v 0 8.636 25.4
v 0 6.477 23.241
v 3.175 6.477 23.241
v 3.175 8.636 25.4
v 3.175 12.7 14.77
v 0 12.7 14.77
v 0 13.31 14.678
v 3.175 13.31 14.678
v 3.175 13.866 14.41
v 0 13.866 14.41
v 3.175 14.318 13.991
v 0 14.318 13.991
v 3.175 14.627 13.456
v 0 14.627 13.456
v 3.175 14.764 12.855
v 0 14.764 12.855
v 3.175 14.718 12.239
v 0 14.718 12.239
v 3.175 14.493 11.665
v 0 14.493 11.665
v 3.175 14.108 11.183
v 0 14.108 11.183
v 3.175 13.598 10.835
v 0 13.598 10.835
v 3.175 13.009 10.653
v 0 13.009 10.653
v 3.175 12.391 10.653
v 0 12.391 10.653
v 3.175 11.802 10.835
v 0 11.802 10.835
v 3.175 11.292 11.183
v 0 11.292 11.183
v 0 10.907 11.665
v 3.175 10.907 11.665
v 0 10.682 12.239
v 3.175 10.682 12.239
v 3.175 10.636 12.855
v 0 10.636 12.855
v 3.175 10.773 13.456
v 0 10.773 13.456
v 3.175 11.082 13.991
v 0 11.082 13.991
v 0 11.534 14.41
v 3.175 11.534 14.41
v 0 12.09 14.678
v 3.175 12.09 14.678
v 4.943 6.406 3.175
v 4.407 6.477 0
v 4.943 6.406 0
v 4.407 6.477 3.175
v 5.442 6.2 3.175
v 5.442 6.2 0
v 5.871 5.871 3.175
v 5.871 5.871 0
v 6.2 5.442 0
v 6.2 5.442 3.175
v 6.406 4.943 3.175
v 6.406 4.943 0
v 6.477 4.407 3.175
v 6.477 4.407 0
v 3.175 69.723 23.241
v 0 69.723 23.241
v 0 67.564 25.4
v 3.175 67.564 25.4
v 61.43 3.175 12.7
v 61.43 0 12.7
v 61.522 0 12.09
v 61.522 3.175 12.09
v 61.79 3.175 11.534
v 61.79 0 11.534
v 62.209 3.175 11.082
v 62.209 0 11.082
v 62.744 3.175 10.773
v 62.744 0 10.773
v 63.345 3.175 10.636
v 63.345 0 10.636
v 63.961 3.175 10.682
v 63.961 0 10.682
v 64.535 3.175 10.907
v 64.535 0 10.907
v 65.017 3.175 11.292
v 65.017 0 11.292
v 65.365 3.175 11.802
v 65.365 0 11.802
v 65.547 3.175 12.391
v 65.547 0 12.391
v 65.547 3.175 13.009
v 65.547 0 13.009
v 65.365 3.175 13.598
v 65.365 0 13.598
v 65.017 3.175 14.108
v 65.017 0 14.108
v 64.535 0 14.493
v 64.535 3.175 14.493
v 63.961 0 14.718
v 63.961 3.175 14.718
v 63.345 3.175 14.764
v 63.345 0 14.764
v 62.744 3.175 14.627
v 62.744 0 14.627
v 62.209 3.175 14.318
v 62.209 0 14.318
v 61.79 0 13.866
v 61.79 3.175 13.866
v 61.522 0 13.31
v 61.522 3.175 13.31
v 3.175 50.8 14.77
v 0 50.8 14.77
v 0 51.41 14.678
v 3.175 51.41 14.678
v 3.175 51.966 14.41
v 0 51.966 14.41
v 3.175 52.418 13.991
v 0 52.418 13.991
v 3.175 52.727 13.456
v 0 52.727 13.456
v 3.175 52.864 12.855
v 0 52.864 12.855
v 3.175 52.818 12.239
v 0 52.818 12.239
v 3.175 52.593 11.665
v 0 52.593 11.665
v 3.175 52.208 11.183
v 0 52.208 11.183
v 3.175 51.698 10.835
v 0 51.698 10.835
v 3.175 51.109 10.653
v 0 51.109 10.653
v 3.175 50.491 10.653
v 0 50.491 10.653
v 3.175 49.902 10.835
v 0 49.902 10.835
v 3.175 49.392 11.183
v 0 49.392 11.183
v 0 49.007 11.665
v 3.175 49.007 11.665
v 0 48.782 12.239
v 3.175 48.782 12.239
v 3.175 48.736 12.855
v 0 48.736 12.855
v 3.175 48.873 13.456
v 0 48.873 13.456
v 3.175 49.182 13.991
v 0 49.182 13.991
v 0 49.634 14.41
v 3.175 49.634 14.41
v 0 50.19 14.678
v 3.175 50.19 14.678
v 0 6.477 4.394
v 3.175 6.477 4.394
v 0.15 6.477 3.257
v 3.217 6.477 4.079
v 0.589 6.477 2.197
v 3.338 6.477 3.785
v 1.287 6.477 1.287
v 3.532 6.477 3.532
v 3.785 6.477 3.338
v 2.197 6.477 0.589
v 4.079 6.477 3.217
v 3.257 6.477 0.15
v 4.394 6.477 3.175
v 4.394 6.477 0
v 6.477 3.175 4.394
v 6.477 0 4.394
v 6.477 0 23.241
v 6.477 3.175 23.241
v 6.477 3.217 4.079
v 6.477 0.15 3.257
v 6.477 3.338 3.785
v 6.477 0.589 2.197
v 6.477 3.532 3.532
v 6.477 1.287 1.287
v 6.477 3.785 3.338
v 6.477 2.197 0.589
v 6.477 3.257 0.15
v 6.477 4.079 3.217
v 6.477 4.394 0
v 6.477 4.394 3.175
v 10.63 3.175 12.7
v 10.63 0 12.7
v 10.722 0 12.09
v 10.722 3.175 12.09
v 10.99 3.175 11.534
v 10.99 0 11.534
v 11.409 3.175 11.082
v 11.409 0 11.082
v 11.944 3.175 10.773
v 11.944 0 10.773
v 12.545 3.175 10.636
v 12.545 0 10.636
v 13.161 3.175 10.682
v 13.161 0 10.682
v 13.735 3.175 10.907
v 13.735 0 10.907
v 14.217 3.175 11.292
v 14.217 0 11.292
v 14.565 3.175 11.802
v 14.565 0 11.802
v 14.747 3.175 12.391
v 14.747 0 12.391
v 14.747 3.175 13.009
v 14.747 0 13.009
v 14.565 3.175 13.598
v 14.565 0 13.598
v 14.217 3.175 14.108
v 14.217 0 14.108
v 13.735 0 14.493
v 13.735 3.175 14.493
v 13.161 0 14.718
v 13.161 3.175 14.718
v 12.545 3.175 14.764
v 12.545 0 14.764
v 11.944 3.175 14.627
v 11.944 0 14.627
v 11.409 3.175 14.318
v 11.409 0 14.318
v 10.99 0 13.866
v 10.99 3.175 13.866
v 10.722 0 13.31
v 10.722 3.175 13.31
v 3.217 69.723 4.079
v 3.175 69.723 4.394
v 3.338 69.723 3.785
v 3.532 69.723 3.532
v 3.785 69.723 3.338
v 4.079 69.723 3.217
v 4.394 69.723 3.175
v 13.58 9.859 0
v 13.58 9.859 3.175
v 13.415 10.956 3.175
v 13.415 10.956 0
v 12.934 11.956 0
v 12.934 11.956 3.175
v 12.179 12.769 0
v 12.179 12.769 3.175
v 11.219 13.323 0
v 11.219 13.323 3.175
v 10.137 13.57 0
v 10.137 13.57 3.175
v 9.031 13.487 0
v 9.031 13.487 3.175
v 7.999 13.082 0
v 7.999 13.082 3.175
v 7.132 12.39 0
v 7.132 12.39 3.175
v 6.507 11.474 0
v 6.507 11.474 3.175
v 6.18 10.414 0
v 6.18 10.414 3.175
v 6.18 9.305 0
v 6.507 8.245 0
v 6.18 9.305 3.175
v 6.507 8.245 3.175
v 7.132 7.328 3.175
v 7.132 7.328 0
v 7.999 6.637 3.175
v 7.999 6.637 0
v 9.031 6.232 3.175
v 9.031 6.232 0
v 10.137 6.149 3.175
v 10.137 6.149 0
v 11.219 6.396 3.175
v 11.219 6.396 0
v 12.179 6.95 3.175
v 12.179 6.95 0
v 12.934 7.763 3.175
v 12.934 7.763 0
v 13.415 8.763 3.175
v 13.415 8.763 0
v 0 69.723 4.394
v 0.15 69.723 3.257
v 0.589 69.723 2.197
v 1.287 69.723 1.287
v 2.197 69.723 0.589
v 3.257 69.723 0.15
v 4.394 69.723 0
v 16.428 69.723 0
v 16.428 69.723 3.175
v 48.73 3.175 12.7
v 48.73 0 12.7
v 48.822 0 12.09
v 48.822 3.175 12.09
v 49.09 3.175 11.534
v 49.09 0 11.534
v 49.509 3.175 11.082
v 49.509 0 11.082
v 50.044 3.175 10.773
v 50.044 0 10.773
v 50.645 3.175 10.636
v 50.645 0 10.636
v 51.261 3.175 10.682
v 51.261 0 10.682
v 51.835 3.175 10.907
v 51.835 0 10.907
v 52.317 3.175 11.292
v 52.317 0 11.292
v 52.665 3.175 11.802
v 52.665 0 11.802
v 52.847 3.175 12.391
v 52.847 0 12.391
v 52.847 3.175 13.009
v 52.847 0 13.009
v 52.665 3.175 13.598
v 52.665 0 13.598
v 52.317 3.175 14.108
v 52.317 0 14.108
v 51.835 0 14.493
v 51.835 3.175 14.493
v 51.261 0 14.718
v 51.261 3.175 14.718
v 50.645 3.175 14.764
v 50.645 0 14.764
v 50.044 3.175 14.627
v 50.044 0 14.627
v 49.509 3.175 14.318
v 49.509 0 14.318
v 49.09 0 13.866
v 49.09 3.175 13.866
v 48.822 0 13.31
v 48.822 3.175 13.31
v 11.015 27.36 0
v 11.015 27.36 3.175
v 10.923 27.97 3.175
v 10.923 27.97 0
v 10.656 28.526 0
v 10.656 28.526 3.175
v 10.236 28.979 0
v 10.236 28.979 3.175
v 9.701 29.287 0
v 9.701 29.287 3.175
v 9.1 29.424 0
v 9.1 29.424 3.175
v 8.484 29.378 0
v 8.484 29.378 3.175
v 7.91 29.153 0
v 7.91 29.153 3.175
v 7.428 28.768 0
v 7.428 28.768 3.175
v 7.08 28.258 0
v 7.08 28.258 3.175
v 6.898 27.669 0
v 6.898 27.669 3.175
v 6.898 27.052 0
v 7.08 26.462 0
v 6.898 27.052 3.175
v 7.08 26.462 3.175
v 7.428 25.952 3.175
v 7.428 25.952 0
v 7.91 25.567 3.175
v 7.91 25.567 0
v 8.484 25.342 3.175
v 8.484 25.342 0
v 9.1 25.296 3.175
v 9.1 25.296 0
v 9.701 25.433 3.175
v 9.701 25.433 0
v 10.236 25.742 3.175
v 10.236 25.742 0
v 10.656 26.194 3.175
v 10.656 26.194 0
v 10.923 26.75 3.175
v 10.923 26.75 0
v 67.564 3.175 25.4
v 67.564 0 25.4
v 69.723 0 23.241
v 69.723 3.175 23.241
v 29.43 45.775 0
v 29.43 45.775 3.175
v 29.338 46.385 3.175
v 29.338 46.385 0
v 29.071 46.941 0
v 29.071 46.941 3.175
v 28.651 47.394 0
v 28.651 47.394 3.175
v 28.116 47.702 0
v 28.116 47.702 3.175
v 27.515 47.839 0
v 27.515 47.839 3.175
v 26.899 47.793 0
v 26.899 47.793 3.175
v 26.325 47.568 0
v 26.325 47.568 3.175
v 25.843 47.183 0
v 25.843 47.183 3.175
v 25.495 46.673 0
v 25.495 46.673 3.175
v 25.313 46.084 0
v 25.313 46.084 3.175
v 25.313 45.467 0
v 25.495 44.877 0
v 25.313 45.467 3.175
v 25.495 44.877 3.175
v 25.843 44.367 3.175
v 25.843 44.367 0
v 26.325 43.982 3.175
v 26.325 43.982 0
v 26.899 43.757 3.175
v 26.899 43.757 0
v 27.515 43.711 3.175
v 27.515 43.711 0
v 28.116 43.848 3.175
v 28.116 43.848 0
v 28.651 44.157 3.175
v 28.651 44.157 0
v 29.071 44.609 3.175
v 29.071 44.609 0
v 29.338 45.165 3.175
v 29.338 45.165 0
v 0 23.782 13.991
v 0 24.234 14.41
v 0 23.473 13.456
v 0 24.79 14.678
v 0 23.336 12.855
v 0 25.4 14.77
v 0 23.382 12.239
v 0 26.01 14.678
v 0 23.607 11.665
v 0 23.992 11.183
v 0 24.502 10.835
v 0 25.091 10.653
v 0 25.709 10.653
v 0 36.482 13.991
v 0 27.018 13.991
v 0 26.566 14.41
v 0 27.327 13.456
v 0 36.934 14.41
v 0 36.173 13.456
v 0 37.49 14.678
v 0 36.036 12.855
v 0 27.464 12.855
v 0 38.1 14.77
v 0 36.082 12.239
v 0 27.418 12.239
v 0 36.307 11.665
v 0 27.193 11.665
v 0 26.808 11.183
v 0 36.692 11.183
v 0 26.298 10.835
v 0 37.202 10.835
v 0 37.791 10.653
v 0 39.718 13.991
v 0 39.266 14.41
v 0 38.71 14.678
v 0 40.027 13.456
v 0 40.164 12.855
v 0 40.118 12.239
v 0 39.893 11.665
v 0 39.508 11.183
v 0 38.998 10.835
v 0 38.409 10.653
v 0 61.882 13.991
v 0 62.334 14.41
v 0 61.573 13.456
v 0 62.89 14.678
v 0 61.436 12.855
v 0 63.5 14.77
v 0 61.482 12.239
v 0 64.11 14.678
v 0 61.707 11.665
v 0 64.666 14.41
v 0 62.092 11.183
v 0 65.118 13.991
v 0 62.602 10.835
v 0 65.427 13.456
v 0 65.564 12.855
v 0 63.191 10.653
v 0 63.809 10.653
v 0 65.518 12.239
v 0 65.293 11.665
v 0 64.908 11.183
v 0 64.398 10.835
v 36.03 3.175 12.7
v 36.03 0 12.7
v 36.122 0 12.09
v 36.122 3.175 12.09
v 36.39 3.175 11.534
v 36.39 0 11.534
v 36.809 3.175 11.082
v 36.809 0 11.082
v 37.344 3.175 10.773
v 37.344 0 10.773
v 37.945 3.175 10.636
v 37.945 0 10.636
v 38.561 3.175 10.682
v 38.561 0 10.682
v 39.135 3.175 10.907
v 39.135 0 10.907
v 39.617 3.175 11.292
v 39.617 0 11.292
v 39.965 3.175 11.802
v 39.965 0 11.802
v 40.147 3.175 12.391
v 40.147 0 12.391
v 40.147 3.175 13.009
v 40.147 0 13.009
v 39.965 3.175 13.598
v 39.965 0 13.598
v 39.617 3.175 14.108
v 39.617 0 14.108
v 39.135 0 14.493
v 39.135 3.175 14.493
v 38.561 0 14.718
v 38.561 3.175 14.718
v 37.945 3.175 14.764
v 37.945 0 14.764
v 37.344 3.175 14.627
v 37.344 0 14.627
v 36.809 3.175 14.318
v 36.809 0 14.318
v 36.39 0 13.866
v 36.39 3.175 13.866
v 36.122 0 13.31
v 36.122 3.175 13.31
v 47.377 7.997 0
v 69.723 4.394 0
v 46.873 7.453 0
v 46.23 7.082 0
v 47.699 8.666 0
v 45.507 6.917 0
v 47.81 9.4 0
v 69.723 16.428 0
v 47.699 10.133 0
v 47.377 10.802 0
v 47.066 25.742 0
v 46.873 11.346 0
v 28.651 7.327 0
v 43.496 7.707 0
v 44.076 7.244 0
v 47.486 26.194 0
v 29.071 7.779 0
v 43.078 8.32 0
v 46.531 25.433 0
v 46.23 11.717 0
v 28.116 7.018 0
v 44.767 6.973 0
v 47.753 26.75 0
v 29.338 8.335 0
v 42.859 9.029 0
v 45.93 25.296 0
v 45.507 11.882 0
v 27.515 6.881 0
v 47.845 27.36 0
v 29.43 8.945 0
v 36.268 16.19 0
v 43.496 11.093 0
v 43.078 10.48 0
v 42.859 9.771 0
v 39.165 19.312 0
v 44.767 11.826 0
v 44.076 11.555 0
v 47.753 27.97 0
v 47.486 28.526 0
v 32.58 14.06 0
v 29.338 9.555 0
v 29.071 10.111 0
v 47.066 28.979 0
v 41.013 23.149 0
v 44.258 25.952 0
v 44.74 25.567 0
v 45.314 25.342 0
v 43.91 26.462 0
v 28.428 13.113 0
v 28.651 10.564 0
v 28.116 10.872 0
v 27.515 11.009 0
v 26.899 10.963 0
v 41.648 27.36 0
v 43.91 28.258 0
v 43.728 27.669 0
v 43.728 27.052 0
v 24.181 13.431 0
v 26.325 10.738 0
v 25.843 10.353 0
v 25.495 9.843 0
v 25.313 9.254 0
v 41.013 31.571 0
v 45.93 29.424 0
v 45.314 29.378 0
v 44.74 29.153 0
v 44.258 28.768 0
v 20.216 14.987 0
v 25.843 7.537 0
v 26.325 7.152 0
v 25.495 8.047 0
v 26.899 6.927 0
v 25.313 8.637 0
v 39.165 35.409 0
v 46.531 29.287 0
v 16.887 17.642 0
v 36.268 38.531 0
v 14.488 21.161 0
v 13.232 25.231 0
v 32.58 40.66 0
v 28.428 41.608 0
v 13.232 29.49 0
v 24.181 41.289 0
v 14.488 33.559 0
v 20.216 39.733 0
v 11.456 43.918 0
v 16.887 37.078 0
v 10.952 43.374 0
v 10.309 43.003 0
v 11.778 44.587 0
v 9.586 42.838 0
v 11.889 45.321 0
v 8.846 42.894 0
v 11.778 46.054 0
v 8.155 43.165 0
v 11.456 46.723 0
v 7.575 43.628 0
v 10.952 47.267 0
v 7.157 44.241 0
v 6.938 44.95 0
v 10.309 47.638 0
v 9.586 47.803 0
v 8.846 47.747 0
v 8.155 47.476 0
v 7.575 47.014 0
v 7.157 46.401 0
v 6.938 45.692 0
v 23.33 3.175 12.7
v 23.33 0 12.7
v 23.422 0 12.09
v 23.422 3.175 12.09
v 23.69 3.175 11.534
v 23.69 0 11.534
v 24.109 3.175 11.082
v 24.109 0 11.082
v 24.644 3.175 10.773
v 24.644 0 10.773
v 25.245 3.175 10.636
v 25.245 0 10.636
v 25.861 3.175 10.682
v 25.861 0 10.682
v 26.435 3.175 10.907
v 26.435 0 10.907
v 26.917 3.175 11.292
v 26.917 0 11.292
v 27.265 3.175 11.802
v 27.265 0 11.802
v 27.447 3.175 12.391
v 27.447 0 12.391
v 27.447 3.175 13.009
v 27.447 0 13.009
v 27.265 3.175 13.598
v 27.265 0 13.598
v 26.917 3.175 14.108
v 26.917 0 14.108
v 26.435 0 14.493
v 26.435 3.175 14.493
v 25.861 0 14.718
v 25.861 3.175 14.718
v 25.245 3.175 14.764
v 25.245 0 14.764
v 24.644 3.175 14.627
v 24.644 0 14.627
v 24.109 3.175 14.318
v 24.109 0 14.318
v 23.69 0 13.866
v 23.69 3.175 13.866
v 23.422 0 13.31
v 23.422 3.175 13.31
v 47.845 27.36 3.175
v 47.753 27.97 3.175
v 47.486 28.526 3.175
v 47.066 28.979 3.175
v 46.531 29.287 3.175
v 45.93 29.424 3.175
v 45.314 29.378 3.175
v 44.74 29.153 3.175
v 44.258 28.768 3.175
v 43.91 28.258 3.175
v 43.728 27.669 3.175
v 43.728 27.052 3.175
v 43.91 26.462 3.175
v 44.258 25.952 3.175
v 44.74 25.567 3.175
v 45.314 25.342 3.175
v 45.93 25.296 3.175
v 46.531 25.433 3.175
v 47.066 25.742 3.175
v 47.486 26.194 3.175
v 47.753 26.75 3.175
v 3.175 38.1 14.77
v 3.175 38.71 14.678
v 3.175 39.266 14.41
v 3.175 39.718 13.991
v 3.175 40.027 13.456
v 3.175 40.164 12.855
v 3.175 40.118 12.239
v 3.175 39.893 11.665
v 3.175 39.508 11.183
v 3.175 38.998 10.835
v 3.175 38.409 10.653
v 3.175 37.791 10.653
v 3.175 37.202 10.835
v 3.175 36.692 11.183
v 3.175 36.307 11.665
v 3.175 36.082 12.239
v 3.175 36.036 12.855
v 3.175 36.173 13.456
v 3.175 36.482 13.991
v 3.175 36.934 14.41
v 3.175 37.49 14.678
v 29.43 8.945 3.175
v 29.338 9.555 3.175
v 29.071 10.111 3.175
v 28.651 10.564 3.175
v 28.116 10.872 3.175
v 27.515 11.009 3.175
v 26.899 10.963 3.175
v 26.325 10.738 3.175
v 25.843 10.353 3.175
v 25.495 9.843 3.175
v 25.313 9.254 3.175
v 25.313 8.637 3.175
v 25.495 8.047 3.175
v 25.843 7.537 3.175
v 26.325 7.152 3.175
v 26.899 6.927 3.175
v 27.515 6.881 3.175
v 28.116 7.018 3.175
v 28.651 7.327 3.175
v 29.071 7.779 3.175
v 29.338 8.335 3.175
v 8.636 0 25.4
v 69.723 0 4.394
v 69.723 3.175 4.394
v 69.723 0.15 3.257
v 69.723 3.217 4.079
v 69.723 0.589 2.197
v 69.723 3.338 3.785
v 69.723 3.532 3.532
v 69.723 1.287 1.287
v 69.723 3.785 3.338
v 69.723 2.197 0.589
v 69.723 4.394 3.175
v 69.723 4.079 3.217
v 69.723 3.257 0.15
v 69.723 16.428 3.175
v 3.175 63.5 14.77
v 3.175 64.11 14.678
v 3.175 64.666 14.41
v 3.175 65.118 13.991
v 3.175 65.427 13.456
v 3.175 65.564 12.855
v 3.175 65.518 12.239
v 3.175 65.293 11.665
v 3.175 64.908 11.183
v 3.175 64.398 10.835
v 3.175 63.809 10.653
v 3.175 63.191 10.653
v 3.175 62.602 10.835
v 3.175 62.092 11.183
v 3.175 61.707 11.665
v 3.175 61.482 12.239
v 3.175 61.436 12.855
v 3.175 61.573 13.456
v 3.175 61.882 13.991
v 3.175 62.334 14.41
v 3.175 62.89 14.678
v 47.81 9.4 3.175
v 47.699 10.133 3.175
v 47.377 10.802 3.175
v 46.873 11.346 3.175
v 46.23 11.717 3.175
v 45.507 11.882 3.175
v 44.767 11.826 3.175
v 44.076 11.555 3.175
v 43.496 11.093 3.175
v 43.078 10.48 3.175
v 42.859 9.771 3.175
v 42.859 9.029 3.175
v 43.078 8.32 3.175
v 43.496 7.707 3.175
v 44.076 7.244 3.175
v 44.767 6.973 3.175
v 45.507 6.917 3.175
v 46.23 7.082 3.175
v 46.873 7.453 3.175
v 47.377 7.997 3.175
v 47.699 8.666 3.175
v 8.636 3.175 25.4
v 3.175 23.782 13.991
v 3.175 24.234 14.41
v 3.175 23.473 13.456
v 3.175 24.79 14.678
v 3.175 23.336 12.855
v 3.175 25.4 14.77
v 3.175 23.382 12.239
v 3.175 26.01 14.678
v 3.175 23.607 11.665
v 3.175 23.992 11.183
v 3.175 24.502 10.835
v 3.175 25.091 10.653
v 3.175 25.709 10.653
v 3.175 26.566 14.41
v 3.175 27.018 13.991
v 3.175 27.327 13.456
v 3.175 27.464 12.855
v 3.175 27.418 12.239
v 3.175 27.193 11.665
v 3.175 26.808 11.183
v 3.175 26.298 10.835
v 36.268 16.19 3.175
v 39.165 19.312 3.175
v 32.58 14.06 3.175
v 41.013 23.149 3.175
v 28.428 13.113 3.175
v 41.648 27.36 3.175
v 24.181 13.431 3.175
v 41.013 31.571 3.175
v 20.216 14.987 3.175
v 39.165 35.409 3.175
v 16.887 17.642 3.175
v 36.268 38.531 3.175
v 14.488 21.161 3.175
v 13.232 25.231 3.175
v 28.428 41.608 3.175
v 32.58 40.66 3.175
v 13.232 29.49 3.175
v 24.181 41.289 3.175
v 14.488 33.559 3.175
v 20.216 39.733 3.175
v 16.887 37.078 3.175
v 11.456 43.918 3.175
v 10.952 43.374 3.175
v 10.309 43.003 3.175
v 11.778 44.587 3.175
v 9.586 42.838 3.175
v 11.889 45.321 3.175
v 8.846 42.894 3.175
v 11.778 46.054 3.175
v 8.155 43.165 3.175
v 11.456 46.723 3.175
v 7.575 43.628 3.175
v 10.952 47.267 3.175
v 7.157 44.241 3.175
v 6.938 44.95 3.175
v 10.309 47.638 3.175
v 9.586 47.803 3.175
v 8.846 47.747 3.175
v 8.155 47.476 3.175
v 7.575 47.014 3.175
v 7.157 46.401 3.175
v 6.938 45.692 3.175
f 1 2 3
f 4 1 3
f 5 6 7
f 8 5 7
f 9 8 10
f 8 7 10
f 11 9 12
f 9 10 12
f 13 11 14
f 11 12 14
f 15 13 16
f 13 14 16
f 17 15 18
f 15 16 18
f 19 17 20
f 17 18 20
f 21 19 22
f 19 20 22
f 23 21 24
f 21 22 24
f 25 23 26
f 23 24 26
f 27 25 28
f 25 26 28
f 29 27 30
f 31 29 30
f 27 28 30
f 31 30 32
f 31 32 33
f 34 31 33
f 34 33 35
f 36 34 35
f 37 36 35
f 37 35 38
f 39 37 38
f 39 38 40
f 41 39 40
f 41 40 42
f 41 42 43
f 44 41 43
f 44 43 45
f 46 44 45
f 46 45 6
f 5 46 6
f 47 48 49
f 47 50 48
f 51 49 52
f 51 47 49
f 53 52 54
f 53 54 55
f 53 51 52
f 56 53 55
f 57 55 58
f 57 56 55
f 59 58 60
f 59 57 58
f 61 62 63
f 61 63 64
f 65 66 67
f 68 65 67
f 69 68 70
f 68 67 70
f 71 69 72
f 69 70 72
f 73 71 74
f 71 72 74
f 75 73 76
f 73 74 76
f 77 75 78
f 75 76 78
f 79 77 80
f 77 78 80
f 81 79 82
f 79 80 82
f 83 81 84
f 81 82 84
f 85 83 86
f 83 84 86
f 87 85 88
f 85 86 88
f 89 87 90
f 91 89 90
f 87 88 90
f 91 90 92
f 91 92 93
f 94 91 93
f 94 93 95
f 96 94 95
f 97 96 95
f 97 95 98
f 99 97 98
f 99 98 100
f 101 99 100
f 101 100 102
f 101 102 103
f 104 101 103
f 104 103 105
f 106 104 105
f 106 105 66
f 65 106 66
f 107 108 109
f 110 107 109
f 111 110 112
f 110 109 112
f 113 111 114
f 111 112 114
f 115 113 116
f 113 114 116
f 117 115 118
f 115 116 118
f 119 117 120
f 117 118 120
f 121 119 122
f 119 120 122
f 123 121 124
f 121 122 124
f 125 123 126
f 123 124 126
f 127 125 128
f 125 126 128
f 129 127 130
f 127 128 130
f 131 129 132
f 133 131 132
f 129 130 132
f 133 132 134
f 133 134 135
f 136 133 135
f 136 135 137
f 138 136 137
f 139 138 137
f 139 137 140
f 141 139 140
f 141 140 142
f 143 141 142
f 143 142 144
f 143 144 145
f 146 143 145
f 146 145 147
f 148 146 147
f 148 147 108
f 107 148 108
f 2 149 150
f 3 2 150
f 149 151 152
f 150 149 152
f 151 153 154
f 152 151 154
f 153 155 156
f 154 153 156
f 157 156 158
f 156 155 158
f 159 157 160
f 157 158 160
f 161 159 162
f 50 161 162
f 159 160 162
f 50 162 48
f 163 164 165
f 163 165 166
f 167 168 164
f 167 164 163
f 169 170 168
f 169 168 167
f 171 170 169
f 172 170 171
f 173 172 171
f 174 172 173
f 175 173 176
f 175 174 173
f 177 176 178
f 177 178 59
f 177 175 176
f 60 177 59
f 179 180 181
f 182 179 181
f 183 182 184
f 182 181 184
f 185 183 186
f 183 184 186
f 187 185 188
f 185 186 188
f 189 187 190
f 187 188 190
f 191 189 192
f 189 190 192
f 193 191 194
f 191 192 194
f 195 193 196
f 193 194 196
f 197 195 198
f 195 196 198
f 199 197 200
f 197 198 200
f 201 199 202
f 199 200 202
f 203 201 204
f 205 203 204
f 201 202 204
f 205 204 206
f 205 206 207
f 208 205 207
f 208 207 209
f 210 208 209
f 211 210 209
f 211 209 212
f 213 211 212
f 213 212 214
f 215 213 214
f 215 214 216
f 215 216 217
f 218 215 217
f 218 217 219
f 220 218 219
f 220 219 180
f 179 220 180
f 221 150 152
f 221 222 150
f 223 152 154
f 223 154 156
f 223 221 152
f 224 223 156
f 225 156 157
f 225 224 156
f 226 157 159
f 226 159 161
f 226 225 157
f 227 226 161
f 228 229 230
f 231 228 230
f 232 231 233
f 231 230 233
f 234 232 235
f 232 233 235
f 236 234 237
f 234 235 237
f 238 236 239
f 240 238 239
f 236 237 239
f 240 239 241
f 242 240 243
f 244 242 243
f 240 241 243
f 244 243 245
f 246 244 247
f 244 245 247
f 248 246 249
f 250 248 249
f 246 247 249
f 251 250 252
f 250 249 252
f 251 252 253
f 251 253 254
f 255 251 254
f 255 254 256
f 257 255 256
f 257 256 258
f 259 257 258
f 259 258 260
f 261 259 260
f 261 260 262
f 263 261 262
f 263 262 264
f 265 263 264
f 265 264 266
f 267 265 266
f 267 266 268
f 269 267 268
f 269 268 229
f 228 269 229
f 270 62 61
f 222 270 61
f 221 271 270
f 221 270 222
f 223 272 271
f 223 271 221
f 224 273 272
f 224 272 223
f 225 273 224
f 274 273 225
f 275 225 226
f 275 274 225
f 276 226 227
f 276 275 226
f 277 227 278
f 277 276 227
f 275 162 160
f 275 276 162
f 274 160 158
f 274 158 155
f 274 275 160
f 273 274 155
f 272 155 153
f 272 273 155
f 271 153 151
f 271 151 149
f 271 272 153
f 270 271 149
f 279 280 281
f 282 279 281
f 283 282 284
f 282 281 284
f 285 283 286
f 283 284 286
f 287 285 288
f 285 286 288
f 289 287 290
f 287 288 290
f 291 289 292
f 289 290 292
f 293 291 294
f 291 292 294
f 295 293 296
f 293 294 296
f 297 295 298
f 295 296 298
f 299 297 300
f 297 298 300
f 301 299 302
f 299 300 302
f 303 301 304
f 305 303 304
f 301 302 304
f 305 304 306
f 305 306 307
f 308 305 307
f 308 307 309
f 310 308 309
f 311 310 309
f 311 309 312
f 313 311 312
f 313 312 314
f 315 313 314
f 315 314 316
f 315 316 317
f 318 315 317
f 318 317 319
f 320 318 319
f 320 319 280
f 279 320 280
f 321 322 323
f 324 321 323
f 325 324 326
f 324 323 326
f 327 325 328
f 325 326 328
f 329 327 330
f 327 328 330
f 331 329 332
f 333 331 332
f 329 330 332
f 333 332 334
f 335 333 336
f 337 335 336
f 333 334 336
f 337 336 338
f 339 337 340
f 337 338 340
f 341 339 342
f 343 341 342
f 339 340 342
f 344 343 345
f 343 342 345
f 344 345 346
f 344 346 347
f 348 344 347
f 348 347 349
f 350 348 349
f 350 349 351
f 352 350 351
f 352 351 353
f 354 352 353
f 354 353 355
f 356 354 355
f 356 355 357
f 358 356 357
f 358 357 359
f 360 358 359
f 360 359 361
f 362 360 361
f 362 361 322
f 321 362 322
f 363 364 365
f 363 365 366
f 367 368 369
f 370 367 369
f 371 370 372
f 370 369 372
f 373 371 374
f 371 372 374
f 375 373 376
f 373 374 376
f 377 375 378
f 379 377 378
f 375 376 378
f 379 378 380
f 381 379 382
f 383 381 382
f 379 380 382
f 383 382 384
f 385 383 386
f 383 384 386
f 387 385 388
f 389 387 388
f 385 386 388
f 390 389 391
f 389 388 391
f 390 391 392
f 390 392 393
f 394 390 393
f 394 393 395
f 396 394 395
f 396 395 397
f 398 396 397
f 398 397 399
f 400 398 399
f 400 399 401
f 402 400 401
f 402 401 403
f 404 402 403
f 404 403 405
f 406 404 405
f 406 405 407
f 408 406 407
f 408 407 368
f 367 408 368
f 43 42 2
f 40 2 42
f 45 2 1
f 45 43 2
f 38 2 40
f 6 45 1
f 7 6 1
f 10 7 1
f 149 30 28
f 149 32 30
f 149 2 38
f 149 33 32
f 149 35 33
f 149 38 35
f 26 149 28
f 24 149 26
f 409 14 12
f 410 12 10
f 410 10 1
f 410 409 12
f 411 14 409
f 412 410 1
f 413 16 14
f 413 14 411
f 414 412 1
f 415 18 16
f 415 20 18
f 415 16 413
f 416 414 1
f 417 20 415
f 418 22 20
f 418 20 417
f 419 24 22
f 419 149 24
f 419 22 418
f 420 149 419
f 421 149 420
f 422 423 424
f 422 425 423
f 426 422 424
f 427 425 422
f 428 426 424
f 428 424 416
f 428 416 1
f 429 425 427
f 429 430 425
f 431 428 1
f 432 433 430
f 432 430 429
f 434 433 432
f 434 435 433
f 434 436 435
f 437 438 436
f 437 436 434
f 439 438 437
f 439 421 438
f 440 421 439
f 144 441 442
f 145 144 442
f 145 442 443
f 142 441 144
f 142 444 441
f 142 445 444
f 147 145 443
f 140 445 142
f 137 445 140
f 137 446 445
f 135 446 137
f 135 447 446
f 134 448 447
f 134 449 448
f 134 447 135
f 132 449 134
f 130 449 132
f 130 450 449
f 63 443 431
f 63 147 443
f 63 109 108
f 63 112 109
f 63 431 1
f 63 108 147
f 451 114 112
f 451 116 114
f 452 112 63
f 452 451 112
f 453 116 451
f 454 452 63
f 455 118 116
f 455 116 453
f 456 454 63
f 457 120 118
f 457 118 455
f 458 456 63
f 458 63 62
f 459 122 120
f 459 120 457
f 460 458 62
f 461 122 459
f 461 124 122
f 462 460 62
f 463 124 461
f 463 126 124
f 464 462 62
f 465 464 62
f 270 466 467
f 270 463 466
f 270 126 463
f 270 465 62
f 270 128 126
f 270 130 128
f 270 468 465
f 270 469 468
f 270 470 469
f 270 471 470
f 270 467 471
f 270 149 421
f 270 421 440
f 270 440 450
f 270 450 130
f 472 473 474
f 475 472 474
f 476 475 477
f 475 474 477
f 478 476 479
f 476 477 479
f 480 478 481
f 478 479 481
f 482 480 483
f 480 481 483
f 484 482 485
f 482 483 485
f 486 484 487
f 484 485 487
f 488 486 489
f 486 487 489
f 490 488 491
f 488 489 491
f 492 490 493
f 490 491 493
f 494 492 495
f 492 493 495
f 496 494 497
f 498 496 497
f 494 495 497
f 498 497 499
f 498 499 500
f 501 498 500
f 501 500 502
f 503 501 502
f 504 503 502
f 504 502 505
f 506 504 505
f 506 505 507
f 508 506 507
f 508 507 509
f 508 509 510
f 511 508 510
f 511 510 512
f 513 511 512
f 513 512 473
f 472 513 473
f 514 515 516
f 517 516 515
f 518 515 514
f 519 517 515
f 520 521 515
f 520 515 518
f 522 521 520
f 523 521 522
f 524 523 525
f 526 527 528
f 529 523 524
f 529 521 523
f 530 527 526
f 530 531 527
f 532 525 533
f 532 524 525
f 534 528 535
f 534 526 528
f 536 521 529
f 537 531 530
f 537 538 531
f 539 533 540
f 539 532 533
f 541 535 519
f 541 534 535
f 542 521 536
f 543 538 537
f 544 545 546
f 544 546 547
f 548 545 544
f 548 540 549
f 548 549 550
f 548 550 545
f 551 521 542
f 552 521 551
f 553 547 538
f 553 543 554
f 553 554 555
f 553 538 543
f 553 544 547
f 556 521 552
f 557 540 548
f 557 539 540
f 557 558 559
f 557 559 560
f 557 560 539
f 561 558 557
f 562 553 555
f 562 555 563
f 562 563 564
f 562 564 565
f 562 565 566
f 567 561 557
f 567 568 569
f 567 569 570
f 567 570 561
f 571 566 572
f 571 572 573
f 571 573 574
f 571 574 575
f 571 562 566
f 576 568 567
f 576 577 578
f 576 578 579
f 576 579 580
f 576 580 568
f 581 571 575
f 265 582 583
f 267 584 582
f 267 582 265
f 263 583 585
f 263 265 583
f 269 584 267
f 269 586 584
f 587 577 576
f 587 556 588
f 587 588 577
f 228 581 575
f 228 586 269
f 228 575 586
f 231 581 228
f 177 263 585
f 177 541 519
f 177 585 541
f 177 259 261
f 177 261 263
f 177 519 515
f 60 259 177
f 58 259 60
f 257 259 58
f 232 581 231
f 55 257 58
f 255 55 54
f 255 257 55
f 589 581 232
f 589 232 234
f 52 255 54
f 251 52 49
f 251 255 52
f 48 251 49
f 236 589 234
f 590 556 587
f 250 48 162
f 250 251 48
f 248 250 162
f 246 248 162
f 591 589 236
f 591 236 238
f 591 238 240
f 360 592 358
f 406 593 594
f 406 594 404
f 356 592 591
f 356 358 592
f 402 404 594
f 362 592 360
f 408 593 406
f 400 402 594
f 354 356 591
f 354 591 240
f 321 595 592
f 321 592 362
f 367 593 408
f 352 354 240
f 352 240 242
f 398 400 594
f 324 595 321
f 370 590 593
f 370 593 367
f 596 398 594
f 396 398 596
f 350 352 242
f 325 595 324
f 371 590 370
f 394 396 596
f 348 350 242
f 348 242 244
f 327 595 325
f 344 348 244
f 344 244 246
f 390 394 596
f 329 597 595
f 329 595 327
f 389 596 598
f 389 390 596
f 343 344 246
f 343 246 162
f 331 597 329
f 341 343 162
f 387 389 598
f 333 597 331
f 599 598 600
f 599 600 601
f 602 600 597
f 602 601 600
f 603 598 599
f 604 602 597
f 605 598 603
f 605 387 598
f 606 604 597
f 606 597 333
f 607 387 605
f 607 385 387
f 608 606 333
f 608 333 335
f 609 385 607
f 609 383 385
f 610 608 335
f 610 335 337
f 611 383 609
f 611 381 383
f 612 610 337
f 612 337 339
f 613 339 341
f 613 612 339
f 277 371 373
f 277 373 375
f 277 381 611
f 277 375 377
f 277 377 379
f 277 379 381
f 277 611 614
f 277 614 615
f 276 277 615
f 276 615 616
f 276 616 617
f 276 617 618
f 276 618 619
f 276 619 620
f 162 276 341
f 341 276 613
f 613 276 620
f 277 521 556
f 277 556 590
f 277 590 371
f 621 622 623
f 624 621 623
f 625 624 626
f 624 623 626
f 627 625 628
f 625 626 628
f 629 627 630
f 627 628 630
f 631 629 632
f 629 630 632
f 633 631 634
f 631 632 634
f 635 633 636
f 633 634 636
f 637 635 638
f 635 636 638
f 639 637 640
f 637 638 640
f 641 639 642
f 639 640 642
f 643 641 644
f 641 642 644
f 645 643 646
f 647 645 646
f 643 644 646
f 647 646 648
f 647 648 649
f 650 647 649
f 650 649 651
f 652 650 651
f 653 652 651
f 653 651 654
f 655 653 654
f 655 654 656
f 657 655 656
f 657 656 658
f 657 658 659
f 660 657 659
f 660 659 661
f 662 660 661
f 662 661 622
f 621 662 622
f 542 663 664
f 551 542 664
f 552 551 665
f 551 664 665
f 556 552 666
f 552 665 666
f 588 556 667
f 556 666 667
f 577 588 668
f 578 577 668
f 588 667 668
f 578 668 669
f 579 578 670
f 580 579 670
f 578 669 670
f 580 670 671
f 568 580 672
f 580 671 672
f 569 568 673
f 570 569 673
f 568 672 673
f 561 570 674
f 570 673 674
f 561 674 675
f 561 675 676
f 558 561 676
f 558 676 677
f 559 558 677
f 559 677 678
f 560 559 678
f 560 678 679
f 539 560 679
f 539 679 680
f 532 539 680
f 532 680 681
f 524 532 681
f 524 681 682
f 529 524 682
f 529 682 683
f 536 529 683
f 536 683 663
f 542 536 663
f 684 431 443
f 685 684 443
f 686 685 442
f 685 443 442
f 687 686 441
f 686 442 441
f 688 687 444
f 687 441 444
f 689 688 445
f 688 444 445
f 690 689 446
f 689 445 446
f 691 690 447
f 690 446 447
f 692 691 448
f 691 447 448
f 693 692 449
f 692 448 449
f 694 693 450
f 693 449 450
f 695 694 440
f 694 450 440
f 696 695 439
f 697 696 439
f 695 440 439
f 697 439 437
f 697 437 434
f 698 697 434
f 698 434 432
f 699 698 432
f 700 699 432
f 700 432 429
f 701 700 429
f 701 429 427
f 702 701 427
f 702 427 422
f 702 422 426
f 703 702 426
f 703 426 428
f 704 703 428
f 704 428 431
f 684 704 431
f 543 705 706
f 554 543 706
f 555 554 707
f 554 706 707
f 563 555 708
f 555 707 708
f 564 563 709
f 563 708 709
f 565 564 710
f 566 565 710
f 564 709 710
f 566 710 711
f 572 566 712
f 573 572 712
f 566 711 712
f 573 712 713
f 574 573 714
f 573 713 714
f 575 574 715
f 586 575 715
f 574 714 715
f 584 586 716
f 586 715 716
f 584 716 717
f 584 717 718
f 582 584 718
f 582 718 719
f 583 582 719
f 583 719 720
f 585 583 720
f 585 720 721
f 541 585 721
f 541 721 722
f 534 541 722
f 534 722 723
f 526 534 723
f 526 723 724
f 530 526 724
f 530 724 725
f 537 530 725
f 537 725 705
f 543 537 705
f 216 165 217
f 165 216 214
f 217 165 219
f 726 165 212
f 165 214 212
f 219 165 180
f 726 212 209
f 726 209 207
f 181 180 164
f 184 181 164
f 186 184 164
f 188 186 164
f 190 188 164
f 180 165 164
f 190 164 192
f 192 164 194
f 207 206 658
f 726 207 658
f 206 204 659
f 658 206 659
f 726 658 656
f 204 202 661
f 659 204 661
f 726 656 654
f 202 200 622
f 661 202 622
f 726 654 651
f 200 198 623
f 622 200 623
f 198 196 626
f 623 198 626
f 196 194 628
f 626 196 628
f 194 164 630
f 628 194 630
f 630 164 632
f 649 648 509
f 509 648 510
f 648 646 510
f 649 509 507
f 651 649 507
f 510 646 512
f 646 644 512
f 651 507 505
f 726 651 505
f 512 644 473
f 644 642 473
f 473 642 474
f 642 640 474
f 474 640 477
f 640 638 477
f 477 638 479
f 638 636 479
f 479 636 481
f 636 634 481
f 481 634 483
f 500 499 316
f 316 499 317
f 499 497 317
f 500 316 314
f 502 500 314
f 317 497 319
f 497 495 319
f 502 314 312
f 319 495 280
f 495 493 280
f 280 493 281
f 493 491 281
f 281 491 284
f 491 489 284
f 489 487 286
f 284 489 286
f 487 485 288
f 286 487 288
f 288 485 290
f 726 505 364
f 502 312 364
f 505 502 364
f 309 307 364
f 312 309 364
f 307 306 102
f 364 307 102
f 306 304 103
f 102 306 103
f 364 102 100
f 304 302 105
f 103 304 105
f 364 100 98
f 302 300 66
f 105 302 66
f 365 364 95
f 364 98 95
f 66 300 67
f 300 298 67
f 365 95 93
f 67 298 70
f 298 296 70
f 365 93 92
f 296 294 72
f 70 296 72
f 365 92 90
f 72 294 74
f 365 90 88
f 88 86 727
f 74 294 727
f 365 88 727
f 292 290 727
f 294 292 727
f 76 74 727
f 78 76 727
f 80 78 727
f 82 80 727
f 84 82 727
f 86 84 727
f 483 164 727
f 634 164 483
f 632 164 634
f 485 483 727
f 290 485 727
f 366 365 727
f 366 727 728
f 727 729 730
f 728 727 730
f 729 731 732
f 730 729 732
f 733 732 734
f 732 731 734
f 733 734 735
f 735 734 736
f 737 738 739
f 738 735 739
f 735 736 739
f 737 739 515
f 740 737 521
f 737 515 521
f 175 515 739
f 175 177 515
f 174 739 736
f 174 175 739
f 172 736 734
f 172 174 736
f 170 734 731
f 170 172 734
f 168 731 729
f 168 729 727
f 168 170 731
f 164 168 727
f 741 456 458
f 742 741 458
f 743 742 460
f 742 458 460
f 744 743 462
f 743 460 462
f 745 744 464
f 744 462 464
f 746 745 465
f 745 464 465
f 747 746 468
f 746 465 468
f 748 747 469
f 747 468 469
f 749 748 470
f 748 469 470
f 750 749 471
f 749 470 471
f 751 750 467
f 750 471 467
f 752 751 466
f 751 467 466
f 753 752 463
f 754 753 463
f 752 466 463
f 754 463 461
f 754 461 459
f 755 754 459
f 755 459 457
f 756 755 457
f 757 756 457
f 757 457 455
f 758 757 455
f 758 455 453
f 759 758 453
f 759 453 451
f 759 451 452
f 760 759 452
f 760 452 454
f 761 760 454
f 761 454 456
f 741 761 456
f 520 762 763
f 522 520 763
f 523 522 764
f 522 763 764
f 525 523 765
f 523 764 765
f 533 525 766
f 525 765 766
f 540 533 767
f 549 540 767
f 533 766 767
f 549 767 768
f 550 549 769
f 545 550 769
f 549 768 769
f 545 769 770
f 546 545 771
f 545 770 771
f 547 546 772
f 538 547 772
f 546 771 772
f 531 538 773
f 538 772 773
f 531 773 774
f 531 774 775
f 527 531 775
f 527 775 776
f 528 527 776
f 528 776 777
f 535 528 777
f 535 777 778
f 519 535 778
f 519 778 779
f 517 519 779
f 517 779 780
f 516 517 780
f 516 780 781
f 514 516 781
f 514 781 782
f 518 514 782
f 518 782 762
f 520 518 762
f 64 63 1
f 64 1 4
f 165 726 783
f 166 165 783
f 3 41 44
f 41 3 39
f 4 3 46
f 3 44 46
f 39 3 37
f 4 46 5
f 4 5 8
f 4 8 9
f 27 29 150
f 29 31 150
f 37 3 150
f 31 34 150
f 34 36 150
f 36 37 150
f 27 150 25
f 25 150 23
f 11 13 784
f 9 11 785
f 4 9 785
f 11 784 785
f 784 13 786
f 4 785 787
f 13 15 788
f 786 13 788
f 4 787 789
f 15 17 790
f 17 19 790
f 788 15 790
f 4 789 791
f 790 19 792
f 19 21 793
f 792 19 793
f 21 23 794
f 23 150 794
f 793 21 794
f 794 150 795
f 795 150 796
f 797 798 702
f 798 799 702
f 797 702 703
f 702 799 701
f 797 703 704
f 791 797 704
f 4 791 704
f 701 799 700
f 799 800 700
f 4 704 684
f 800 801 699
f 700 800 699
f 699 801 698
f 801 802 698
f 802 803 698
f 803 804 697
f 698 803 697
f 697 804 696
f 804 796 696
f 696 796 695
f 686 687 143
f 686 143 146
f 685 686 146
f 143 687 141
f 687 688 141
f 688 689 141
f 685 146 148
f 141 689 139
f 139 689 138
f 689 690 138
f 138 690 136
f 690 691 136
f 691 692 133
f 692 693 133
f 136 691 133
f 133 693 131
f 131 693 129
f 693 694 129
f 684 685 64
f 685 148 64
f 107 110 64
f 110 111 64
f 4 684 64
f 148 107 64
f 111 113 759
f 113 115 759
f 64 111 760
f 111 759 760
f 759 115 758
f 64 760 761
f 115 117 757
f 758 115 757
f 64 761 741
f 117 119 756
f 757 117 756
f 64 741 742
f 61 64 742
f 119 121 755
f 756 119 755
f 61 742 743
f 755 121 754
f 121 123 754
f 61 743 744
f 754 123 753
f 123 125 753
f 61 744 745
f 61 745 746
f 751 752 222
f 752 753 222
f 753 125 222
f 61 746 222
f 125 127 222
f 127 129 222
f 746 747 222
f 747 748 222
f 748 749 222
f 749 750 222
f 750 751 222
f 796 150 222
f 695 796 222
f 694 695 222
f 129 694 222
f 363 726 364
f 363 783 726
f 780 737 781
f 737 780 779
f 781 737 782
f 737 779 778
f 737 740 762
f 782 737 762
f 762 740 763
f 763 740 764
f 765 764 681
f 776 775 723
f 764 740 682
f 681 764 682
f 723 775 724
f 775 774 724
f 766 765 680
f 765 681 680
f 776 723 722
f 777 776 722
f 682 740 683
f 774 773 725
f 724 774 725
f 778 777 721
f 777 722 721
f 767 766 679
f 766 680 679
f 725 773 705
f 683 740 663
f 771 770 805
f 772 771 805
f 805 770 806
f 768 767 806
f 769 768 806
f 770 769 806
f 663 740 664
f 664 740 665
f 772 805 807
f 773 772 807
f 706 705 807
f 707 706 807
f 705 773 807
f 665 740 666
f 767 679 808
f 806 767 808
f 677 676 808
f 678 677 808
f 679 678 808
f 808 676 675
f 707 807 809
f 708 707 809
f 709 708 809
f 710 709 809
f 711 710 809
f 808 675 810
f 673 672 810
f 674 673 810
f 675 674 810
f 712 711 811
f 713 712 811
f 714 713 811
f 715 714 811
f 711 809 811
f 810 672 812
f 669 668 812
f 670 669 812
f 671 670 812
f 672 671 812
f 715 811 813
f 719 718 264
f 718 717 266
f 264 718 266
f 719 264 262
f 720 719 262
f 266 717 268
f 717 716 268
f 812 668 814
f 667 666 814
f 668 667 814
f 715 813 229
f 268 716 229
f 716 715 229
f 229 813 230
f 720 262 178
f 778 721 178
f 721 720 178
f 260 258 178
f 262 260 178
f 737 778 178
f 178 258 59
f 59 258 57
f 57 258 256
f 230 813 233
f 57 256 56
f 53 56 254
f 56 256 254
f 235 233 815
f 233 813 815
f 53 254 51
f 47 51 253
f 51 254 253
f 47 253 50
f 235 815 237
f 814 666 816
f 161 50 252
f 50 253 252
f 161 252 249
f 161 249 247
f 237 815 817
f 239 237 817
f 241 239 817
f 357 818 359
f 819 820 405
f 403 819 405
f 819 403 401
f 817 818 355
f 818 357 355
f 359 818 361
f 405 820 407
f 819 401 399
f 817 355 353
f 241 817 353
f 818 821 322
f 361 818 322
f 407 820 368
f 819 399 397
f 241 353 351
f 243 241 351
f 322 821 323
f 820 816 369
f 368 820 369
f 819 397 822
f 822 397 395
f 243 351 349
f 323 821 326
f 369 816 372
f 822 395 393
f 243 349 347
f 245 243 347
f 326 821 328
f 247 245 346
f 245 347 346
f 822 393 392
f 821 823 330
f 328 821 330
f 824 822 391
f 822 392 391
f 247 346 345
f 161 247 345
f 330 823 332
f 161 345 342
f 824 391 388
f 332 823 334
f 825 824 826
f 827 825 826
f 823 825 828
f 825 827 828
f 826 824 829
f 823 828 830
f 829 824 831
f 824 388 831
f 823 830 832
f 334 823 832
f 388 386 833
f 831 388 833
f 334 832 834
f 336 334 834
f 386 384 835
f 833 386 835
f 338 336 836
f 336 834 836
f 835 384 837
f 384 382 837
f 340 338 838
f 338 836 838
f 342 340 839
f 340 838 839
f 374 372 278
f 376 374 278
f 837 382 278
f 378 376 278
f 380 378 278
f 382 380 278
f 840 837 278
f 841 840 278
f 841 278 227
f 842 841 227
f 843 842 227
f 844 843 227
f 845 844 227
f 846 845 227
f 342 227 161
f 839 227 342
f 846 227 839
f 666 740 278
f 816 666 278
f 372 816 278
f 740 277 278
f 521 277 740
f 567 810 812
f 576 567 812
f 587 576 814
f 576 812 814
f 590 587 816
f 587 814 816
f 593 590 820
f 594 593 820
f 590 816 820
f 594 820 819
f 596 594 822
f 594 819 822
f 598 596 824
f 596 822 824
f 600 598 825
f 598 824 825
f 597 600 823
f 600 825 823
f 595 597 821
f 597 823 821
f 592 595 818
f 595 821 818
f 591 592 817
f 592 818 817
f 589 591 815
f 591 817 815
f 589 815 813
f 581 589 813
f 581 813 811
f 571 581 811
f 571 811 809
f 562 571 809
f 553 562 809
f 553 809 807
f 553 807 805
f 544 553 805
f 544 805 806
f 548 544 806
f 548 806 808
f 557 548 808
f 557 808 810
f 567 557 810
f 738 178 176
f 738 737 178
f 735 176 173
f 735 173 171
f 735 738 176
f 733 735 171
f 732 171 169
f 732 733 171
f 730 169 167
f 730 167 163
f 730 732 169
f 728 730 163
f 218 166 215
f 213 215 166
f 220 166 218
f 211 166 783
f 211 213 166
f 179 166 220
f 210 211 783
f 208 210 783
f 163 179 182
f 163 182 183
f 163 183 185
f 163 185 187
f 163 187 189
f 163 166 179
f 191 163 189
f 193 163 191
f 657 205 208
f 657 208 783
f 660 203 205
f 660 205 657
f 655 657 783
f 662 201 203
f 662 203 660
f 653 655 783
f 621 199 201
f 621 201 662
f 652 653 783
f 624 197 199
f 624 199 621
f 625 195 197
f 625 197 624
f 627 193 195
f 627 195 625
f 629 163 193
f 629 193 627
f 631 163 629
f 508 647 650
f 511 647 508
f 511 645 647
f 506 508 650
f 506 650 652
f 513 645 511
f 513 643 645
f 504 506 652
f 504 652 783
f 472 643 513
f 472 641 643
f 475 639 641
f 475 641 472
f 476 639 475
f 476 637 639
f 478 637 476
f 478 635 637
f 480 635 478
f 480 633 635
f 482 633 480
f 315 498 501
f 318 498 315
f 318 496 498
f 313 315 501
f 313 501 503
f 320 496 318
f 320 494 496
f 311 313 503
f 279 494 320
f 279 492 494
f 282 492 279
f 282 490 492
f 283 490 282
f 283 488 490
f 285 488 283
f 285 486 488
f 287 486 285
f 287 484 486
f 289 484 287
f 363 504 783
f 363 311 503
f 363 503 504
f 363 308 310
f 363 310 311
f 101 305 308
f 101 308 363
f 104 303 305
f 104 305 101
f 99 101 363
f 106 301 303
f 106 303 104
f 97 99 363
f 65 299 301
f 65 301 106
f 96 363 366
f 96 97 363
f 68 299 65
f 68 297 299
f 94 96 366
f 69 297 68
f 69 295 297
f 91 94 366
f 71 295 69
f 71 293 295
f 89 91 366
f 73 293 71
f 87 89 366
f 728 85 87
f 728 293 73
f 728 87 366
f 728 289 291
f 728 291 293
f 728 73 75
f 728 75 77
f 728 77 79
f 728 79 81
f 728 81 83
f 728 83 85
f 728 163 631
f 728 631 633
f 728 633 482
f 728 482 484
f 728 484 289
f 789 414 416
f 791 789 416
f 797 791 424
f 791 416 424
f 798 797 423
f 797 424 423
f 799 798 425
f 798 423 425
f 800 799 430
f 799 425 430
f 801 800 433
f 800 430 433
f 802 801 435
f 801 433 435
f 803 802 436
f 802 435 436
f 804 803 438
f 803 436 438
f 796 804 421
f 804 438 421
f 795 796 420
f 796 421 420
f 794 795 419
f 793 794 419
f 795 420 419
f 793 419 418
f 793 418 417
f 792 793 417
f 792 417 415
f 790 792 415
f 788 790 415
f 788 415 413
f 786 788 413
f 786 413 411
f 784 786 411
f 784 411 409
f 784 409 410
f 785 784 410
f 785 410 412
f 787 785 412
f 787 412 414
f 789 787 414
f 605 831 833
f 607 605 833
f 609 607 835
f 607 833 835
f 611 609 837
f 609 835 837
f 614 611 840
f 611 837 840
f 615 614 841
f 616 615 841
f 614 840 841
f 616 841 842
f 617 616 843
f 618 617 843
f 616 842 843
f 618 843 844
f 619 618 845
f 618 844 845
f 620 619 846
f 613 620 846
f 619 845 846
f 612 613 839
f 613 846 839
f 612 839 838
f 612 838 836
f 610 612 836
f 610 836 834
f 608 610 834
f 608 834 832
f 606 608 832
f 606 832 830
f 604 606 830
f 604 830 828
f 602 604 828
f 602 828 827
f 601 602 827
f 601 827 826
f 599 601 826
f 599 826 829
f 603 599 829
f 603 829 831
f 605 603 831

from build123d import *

# Parameters (mm, degrees)
BOSS_EXTRUDE1_DEPTH        = 3.175
SKETCH2_W                  = 6.477
SKETCH2_H                  = 6.477
CUT_EXTRUDE1_DEPTH         = 4.175
SKETCH3_W                  = 63.246
SKETCH3_H                  = 3.175
BOSS_EXTRUDE2_DEPTH        = 22.225
SKETCH4_W                  = 3.175
SKETCH4_H                  = 63.246
BOSS_EXTRUDE3_DEPTH        = 22.225
M6_5_CLEARANCE_HOLE1_D     = 7.4422
M6_5_CLEARANCE_HOLE1_DEPTH = 25.400025
M25_CLEARANCE_HOLE1_D      = 28.575
M25_CLEARANCE_HOLE1_DEPTH  = 25.400025
HOLE1_D                    = 4.9784
HOLE1_DEPTH                = 25.400025
M3_5_CLEARANCE_HOLE1_D     = 4.1402
M3_5_CLEARANCE_HOLE1_DEPTH = 25.400025
M3_5_CLEARANCE_HOLE2_D     = 4.1402
M3_5_CLEARANCE_HOLE2_DEPTH = 3.175
M3_5_CLEARANCE_HOLE3_D     = 4.1402
M3_5_CLEARANCE_HOLE3_DEPTH = 3.175
CHAMFER1_SIZE              = 2.159
FILLET1_R                  = 1.2192
FILLET2_R                  = 2.0701
FILLET3_R                  = 4.3942


with BuildPart() as part:
    # Sketch1 → Boss-Extrude1 (new body)
    with BuildSketch(Plane(origin=(0, 0, 0), x_dir=(-1, 0, 0), z_dir=(0, 0, -1))):
        Polygon((-69.723, 0), (0, 0), (0, 69.723), (-16.428128061, 69.723), (-69.723, 16.428128061), align=None)
    extrude(amount=-BOSS_EXTRUDE1_DEPTH)

    # Sketch2 → Cut-Extrude1 (cut, through all)
    with BuildSketch(Plane(origin=(0, 0, 0), x_dir=(-1, 0, 0), z_dir=(0, 0, -1))):
        with Locations((-3.2385, 3.2385)):
            Rectangle(SKETCH2_W, SKETCH2_H)
    extrude(amount=-CUT_EXTRUDE1_DEPTH, mode=Mode.SUBTRACT)

    # Sketch3 → Boss-Extrude2 (add)
    with BuildSketch(Plane.XY.offset(3.175)):
        with Locations((38.1, 1.5875)):
            Rectangle(SKETCH3_W, SKETCH3_H)
    extrude(amount=BOSS_EXTRUDE2_DEPTH)

    # Sketch4 → Boss-Extrude3 (add)
    with BuildSketch(Plane.XY.offset(3.175)):
        with Locations((1.5875, 38.1)):
            Rectangle(SKETCH4_W, SKETCH4_H)
    extrude(amount=BOSS_EXTRUDE3_DEPTH)

    # M6.5 Clearance Hole1
    with Locations(Plane(origin=(0, 0, 0), x_dir=(-1, 0, 0), z_dir=(0, 0, -1))):
        with Locations((-9.85939269, 9.85939269)):
            Hole(M6_5_CLEARANCE_HOLE1_D / 2, depth=M6_5_CLEARANCE_HOLE1_DEPTH)

    # M25 Clearance Hole1
    with Locations(Plane(origin=(0, 0, 0), x_dir=(-1, 0, 0), z_dir=(0, 0, -1))):
        with Locations((-27.360115818, 27.360115818)):
            Hole(M25_CLEARANCE_HOLE1_D / 2, depth=M25_CLEARANCE_HOLE1_DEPTH)

    # Hole1
    with Locations(Plane(origin=(0, 0, 0), x_dir=(-1, 0, 0), z_dir=(0, 0, -1))):
        with Locations((-9.399603576, 45.320628061), (-45.320628061, 9.399603576)):
            Hole(HOLE1_D / 2, depth=HOLE1_DEPTH)

    # M3.5 Clearance Hole1
    with Locations(Plane(origin=(0, 0, 0), x_dir=(-1, 0, 0), z_dir=(0, 0, -1))):
        with Locations((-45.775115818, 27.360115818), (-8.945115818, 27.360115818), (-27.360115818, 45.775115818), (-27.360115818, 8.945115818)):
            Hole(M3_5_CLEARANCE_HOLE1_D / 2, depth=M3_5_CLEARANCE_HOLE1_DEPTH)

    # M3.5 Clearance Hole2
    with Locations(Plane(origin=(3.175, 0, 0), x_dir=(0, 0, -1), z_dir=(1, 0, 0))):
        with Locations((-12.7, 63.5), (-12.7, 50.8), (-12.7, 38.1), (-12.7, 25.4), (-12.7, 12.7)):
            Hole(M3_5_CLEARANCE_HOLE2_D / 2, depth=M3_5_CLEARANCE_HOLE2_DEPTH)

    # M3.5 Clearance Hole3
    with Locations(Plane(origin=(0, 3.175, 0), x_dir=(1, 0, 0), z_dir=(0, 1, 0))):
        with Locations((63.5, -12.7), (50.8, -12.7), (38.1, -12.7), (25.4, -12.7), (12.7, -12.7)):
            Hole(M3_5_CLEARANCE_HOLE3_D / 2, depth=M3_5_CLEARANCE_HOLE3_DEPTH)

    # Chamfer1
    chamfer1_edges = [part.edges().sort_by_distance(p)[0] for p in [
        (1.5875, 6.477, 25.4),
        (1.5875, 69.723, 25.4),
        (6.477, 1.5875, 25.4),
        (69.723, 1.5875, 25.4),
    ]]
    chamfer(chamfer1_edges, length=CHAMFER1_SIZE)

    # Fillet1
    fillet1_edges = [part.edges().sort_by_distance(p)[0] for p in [
        (38.1, 3.175, 3.175),
        (3.175, 38.1, 3.175),
    ]]
    fillet(fillet1_edges, radius=FILLET1_R)

    # Fillet2
    fillet2_edges = [part.edges().sort_by_distance(p)[0] for p in [
        (6.477, 6.477, 1.5875),
    ]]
    fillet(fillet2_edges, radius=FILLET2_R)

    # Fillet3
    fillet3_edges = [part.edges().sort_by_distance(p)[0] for p in [
        (0, 38.1, 0),
        (38.1, 0, 0),
    ]]
    fillet(fillet3_edges, radius=FILLET3_R)


solid = part.part
